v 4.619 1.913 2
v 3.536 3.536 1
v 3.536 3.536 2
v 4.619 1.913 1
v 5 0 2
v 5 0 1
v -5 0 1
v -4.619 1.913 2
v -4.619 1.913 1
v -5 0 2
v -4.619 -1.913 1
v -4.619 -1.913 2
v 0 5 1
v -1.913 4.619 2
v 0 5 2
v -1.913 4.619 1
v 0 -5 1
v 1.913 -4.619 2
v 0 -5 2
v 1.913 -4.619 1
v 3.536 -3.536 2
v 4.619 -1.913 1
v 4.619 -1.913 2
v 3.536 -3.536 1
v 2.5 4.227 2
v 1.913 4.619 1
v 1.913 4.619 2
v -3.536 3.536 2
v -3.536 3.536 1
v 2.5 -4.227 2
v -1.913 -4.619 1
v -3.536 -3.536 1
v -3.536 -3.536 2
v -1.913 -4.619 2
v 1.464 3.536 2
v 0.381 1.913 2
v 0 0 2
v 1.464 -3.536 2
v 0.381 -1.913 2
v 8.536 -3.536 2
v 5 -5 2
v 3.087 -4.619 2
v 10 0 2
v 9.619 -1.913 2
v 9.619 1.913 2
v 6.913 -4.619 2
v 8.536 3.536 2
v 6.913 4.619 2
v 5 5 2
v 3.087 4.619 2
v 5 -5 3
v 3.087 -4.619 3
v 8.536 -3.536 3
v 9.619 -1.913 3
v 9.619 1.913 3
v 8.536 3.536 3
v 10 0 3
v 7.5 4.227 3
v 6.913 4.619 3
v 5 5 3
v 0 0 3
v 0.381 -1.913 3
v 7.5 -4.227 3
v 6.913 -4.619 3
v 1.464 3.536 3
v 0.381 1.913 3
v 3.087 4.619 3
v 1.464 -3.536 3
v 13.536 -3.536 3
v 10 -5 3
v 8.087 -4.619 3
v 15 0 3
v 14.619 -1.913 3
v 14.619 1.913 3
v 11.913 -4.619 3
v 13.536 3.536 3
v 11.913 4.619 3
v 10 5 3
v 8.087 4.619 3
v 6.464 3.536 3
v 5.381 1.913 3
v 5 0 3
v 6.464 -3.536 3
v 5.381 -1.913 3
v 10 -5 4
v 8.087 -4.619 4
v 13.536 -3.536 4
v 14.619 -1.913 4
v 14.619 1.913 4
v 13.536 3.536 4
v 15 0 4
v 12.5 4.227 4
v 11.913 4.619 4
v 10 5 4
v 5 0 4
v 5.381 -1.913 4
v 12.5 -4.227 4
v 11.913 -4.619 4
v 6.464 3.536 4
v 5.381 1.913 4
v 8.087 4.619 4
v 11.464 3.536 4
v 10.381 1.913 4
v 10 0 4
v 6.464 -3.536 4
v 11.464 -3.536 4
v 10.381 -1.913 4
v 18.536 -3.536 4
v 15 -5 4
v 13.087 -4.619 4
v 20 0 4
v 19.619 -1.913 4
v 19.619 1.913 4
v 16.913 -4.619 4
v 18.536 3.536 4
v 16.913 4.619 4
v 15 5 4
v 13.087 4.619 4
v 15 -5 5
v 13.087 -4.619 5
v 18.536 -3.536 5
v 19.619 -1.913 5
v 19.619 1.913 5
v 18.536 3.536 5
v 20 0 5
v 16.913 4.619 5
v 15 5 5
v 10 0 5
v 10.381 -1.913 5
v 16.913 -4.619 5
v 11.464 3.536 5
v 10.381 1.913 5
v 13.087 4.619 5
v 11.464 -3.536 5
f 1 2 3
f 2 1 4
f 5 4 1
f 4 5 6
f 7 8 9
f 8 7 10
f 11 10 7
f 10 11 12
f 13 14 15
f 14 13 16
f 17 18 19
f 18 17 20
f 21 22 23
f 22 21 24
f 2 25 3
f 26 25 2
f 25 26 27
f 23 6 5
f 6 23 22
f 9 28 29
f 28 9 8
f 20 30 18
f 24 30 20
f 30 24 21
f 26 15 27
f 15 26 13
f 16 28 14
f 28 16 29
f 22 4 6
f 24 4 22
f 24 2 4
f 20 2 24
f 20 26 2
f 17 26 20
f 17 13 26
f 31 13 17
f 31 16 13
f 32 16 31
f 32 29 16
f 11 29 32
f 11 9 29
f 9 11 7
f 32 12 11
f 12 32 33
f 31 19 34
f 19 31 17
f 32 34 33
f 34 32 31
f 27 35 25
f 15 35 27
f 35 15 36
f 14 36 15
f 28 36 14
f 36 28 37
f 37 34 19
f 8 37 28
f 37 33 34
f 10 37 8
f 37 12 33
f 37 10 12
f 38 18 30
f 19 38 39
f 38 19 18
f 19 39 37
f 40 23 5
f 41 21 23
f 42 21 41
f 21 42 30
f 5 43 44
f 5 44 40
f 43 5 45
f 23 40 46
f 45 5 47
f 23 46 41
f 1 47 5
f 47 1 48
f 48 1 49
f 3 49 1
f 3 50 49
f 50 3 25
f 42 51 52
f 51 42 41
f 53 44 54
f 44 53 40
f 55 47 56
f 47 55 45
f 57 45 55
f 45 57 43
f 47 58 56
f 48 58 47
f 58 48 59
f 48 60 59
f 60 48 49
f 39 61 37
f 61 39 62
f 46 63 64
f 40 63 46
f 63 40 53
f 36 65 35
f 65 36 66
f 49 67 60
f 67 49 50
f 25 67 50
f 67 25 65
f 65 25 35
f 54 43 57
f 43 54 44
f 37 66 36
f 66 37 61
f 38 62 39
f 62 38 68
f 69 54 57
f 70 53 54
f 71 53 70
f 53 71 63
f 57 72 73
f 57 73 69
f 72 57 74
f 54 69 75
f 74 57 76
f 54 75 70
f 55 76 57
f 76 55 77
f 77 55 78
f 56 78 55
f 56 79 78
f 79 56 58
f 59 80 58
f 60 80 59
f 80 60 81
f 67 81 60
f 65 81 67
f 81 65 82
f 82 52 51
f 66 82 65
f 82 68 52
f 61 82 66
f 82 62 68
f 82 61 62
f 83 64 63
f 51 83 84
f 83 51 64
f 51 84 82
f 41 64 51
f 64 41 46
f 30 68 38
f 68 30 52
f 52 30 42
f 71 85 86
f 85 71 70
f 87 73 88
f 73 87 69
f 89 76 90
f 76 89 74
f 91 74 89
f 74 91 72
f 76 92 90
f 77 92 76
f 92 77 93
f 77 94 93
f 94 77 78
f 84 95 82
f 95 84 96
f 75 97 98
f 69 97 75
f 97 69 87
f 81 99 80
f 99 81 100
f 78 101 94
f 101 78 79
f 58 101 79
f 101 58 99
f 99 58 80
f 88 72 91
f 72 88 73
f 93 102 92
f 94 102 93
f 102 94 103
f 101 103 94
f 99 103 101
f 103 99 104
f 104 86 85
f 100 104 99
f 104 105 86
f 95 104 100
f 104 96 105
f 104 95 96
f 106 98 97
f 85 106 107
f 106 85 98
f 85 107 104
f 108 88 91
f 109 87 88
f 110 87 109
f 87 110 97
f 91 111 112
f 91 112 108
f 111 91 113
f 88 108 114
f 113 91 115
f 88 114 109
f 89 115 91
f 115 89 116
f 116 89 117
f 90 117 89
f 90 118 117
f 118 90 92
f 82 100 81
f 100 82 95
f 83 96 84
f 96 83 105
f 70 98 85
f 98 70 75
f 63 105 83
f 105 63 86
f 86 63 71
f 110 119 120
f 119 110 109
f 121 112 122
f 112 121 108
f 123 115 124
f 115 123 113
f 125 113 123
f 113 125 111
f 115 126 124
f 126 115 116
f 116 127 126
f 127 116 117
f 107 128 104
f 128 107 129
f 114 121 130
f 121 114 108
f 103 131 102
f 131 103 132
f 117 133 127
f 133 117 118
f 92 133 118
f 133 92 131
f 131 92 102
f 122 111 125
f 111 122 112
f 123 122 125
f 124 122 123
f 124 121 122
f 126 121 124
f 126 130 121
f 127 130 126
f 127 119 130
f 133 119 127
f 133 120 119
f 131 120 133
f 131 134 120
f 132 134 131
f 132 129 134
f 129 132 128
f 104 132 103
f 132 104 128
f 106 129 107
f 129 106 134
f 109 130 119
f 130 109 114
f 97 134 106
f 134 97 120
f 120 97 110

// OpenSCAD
module up() {
  translate([0,0,1]) child(0);
}

module red() {
  color("Red") child(0);
}

up() cylinder(r=5);
translate([5,0,0]) up() up() cylinder(r=5);
translate([10,0,0]) up() up() up() red() cylinder(r=5);
translate([15,0,0]) red() up() up() up() up() cylinder(r=5);
